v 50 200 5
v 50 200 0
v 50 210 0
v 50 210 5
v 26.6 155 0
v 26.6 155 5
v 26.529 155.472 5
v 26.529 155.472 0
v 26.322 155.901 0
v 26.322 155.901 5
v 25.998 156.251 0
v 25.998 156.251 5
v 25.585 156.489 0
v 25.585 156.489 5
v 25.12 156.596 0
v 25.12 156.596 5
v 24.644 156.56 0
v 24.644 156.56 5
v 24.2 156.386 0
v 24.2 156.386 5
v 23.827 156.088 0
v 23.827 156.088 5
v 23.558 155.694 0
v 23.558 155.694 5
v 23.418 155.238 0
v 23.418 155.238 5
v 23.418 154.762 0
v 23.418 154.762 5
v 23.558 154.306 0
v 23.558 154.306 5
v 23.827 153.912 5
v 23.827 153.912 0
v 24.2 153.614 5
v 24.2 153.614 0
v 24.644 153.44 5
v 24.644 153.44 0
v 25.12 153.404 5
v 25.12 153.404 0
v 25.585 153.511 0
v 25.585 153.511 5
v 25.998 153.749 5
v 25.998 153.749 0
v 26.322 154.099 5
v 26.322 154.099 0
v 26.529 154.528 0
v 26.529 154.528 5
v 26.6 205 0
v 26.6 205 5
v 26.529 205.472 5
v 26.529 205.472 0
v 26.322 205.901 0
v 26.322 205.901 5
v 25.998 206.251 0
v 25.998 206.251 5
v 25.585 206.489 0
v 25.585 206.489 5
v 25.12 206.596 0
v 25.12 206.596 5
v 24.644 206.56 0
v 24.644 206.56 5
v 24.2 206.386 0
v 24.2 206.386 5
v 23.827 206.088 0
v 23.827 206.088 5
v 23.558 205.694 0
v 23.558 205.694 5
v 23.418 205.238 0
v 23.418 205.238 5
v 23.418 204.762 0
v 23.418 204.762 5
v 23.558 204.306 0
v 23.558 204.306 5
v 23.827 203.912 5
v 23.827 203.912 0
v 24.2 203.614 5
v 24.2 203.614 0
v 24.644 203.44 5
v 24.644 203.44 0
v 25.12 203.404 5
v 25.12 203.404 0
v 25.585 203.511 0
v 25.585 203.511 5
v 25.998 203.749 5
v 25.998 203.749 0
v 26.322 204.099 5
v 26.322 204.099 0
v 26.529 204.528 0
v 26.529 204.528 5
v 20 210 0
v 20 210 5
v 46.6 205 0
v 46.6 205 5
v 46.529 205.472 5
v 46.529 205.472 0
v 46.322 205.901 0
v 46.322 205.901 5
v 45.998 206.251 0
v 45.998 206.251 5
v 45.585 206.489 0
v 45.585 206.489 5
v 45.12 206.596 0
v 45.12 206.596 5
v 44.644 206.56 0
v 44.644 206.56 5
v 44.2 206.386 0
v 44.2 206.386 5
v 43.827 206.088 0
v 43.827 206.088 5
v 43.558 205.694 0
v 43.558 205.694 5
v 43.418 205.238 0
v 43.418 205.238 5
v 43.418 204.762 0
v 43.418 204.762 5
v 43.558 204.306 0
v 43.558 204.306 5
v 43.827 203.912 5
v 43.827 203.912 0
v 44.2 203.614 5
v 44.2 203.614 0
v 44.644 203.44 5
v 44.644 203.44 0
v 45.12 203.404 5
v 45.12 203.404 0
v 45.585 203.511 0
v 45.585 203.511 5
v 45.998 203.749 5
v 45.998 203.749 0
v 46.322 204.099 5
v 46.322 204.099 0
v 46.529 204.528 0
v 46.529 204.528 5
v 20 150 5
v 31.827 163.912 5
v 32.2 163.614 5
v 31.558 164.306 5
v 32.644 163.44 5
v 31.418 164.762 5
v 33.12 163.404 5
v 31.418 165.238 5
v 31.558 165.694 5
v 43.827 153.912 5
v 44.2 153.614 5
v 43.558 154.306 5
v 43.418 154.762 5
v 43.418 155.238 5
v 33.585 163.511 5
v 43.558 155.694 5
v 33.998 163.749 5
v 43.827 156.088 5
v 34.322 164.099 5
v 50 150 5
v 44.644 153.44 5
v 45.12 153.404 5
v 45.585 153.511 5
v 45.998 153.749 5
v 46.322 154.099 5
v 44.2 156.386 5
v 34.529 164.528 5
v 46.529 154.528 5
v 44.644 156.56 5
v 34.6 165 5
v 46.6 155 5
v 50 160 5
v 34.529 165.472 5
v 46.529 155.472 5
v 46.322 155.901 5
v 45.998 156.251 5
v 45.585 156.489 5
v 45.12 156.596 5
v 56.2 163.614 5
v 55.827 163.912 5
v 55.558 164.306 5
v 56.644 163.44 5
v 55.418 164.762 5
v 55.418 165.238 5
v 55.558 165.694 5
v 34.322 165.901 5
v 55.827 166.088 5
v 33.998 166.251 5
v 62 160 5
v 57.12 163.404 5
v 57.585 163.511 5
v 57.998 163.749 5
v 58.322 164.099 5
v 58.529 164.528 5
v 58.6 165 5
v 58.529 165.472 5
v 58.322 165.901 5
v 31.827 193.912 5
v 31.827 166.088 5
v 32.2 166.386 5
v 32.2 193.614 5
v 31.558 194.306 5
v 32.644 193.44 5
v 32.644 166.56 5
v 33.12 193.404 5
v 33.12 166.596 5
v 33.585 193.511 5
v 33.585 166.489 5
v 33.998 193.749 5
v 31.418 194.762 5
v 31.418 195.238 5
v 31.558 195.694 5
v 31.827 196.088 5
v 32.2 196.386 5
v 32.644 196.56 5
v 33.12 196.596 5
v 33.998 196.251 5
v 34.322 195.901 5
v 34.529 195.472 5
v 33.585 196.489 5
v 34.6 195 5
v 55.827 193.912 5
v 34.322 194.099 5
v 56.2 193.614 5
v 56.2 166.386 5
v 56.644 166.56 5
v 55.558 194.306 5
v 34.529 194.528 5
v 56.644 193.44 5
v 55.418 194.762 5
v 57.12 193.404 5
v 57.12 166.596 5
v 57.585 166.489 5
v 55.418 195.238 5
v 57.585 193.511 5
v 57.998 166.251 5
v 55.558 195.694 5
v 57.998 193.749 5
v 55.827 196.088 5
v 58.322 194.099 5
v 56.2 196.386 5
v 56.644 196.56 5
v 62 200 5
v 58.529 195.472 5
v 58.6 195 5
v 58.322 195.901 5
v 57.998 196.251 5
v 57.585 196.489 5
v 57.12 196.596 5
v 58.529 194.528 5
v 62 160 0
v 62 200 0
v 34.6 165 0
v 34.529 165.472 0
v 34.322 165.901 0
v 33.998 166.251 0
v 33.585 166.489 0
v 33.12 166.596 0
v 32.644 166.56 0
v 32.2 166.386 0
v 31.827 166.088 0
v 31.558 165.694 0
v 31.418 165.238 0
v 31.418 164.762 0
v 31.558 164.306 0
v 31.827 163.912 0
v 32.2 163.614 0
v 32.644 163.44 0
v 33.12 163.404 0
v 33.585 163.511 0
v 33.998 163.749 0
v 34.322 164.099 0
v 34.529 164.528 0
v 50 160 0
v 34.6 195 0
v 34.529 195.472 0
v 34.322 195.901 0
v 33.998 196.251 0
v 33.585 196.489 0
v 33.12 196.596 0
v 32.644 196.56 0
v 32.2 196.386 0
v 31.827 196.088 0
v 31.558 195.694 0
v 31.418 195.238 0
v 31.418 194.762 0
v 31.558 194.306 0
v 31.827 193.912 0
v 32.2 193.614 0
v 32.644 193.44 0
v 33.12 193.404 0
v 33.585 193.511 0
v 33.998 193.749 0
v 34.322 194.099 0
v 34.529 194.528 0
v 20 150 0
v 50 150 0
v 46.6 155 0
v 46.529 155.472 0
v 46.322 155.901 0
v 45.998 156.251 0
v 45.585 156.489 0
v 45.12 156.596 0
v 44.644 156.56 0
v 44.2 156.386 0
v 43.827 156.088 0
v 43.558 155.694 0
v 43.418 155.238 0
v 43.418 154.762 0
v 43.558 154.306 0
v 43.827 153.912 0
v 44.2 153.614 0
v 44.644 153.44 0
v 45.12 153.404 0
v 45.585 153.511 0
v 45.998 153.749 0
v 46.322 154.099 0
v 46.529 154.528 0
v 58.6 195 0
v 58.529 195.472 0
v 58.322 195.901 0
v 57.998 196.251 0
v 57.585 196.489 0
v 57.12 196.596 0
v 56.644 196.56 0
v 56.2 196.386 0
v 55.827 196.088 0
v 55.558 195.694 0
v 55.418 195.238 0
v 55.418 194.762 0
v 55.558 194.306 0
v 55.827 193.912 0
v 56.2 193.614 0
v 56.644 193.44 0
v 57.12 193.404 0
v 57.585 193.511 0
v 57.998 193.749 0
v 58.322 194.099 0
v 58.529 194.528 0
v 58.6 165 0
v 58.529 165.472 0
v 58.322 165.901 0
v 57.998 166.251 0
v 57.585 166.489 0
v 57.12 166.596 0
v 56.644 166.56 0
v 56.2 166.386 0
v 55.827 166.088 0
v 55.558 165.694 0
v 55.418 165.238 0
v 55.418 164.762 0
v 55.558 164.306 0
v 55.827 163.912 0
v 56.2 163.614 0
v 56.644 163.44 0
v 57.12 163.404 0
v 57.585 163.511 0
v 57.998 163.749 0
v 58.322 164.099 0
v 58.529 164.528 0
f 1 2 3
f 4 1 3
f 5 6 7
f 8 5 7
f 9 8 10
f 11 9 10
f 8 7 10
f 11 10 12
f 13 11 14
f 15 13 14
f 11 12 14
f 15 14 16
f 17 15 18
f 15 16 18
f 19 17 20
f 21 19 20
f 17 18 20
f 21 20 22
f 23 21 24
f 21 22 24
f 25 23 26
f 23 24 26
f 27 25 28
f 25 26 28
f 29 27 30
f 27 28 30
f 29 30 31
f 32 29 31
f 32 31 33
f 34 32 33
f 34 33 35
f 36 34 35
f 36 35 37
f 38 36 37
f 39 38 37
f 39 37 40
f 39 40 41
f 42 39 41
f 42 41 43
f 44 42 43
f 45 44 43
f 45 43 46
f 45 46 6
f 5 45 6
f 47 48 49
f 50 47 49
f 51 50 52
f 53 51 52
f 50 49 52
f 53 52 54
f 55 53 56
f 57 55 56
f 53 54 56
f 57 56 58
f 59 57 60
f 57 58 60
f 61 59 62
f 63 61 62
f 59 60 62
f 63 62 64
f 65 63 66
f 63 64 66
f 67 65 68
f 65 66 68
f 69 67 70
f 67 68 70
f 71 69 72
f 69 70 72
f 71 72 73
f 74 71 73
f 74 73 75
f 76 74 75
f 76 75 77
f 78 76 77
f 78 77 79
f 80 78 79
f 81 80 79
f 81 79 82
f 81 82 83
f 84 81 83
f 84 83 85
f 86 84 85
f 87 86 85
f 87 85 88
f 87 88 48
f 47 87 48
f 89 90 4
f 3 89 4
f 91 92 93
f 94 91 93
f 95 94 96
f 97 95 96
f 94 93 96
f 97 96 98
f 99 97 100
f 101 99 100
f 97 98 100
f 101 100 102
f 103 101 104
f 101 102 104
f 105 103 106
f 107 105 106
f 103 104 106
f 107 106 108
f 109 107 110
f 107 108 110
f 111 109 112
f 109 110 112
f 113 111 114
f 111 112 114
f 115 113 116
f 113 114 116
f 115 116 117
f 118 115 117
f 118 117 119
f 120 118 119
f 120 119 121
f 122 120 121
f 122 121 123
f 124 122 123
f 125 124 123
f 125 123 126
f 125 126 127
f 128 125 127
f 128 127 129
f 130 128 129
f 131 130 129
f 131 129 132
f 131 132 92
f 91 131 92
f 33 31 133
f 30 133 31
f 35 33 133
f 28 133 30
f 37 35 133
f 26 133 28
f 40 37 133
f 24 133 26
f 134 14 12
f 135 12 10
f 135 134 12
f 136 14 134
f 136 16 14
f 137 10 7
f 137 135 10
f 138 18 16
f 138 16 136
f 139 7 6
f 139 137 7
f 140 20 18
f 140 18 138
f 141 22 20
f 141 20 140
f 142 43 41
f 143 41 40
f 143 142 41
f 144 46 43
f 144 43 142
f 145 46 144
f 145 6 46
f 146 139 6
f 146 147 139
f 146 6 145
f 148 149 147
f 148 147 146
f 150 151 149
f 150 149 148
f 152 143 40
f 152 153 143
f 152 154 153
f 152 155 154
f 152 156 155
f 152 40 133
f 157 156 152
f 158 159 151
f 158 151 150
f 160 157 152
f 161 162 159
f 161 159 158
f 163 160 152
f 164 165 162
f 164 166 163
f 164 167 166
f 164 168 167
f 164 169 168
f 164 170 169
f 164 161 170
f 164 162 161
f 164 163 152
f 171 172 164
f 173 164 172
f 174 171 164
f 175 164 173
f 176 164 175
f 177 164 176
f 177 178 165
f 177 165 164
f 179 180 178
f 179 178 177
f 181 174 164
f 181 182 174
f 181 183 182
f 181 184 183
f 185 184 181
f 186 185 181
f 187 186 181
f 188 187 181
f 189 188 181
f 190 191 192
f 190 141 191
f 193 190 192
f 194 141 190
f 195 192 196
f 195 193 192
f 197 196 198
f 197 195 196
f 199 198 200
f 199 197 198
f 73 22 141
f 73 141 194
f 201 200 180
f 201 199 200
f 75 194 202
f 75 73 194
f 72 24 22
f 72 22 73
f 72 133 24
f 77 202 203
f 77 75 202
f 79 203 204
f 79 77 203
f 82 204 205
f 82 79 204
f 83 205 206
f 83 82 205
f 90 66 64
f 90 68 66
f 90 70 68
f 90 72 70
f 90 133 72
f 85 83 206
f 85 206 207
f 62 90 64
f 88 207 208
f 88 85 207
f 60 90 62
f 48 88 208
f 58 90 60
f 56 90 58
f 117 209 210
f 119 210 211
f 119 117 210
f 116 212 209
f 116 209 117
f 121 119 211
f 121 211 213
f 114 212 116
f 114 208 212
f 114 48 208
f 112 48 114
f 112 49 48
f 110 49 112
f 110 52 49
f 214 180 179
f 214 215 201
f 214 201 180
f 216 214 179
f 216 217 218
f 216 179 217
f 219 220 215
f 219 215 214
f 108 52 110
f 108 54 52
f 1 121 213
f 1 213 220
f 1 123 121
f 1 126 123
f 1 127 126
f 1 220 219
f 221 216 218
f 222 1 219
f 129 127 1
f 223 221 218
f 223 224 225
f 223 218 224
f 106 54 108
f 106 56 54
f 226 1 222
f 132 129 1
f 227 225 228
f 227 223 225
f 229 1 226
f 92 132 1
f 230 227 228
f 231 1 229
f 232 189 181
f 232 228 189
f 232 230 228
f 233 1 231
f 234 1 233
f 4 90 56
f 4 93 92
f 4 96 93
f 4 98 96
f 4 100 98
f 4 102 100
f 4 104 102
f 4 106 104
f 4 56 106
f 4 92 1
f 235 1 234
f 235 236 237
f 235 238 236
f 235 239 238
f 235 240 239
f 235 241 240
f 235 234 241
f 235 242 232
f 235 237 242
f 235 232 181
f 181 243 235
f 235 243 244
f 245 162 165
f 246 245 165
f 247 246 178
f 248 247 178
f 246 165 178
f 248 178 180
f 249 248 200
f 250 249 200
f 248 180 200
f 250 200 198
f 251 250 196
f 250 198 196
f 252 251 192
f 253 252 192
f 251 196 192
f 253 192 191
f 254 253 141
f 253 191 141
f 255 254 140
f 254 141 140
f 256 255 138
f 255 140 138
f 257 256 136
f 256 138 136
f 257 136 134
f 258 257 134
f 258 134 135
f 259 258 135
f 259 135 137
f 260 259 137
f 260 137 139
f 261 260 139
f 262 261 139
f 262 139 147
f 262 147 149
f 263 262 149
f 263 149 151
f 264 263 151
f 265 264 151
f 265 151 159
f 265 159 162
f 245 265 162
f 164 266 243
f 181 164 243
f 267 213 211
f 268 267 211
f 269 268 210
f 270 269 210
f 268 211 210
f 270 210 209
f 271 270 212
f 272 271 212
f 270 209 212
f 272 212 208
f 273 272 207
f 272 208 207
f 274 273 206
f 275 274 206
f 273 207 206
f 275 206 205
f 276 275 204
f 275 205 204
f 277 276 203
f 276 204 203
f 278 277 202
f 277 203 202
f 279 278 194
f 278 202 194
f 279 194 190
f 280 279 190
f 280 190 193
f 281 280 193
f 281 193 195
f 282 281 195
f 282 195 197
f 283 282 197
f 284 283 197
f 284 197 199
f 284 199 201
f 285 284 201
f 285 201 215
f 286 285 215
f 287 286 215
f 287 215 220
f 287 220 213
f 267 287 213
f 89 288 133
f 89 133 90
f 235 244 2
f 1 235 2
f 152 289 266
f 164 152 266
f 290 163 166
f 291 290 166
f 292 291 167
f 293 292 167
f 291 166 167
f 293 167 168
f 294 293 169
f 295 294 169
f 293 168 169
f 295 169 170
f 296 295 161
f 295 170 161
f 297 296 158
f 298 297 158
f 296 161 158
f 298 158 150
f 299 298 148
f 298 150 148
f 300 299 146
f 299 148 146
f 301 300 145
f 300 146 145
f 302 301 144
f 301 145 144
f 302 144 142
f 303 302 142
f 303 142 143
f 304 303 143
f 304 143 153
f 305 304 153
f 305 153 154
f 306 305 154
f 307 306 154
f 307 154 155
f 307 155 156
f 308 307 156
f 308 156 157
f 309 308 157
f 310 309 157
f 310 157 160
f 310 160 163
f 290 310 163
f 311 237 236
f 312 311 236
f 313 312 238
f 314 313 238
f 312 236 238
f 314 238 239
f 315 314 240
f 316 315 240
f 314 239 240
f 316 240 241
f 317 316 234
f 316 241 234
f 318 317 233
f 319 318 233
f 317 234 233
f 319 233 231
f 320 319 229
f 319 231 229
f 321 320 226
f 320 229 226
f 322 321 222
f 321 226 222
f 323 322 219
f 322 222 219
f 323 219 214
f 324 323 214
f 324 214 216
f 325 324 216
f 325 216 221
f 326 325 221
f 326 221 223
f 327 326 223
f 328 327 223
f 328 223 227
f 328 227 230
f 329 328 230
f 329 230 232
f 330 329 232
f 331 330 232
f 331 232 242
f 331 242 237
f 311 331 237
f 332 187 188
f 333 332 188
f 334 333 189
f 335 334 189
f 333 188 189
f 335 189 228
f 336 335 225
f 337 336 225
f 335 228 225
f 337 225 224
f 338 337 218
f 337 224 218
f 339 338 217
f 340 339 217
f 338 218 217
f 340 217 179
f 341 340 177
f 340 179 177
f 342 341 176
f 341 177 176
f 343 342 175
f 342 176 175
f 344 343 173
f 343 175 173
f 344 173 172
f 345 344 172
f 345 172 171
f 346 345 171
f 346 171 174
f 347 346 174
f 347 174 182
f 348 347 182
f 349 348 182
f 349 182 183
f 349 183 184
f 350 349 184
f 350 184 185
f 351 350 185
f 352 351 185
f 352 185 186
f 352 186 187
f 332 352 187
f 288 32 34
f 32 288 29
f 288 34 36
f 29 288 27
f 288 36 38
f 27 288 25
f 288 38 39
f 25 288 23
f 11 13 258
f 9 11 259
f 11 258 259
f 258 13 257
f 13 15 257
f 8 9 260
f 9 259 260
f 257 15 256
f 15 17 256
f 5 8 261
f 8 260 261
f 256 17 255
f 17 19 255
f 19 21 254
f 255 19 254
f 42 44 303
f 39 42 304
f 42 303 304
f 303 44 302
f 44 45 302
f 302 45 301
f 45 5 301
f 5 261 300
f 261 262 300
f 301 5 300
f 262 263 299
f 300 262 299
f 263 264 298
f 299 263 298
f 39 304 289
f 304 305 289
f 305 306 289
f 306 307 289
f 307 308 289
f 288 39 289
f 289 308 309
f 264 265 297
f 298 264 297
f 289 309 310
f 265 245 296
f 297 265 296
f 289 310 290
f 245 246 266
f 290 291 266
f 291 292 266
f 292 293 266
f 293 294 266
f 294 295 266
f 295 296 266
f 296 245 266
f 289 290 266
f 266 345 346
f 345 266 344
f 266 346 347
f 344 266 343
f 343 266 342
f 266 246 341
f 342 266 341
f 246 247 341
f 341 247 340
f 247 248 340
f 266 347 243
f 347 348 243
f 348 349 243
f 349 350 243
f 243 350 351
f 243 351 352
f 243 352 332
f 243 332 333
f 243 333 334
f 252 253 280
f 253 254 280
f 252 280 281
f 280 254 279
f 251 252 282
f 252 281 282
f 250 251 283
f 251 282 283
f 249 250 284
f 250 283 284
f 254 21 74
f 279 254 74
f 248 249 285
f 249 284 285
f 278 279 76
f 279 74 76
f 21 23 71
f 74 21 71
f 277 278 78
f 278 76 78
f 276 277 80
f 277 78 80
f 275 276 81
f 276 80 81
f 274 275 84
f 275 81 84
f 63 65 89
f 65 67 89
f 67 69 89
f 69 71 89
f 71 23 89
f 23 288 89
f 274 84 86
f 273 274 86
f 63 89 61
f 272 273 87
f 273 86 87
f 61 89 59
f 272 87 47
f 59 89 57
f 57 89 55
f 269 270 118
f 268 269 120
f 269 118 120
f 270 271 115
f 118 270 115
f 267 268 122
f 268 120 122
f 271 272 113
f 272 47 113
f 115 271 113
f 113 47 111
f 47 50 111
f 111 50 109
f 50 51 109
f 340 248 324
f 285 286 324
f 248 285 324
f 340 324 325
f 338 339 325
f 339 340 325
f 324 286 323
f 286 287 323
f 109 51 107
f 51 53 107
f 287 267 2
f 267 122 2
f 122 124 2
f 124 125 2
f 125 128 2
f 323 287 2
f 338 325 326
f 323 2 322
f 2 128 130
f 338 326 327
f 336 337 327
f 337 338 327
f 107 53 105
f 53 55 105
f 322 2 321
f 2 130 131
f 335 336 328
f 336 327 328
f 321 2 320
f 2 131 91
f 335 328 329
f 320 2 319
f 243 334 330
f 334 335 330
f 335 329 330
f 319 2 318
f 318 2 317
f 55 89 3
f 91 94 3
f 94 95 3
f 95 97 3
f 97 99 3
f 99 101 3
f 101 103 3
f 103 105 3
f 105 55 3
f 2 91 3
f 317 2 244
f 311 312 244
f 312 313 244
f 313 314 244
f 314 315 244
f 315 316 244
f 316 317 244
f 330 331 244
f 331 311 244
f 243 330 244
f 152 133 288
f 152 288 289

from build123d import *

# Parameters (mm, degrees)
EXTRUDE_1_DEPTH     = 5
SKETCH_5_R          = 1.6
CUT_EXTRUDE_1_DEPTH = 329.148213465
SKETCH_6_W          = 3
SKETCH_6_H          = 30
CUT_EXTRUDE_2_DEPTH = 329.148213465
SKETCH_7_W          = 3
SKETCH_7_H          = 10
CUT_EXTRUDE_3_DEPTH = 329.148213465
SKETCH_8_W          = 15
SKETCH_8_H          = 3
CUT_EXTRUDE_4_DEPTH = 329.148213465
SKETCH_9_W          = 30
SKETCH_9_H          = 0.36
EXTRUDE_2_DEPTH     = 5
SKETCH_11_W         = 200
SKETCH_11_H         = 355
SKETCH_11_W_2       = 46
SKETCH_11_H_2       = 60
CUT_EXTRUDE_5_DEPTH = 329.148213465
CUT_EXTRUDE_7_DEPTH = 221.184013952
SKETCH_13_R         = 1.6
CUT_EXTRUDE_8_DEPTH = 220.018264079


with BuildPart() as part:
    # 草图3 → 凸台-拉伸1 (new body)
    with BuildSketch(Plane.XY):
        Polygon((-10, 267.5), (190, 267.5), (190, 230), (160, 230), (160, 130), (190, 130), (190, 50), (160, 50), (160, -50), (190, -50), (190, -87.5), (-10, -87.5), (-10, -50), (20, -50), (20, 50), (-10, 50), (-10, 130), (20, 130), (20, 230), (-10, 230), align=None)
    extrude(amount=EXTRUDE_1_DEPTH)

    # 草图5 → 切除-拉伸1 (cut, through all)
    with BuildSketch(Plane.XY.offset(5)):
        with Locations((33, 195)):
            Circle(SKETCH_5_R)
        with Locations((57, 195)):
            Circle(SKETCH_5_R)
        with Locations((33, 165)):
            Circle(SKETCH_5_R)
        with Locations((57, 165)):
            Circle(SKETCH_5_R)
        with Locations((123, 195)):
            Circle(SKETCH_5_R)
        with Locations((147, 195)):
            Circle(SKETCH_5_R)
        with Locations((123, 165)):
            Circle(SKETCH_5_R)
        with Locations((147, 165)):
            Circle(SKETCH_5_R)
        with Locations((33, 15)):
            Circle(SKETCH_5_R)
        with Locations((57, 15)):
            Circle(SKETCH_5_R)
        with Locations((33, -15)):
            Circle(SKETCH_5_R)
        with Locations((57, -15)):
            Circle(SKETCH_5_R)
        with Locations((123, 15)):
            Circle(SKETCH_5_R)
        with Locations((147, 15)):
            Circle(SKETCH_5_R)
        with Locations((123, -15)):
            Circle(SKETCH_5_R)
        with Locations((147, -15)):
            Circle(SKETCH_5_R)
    extrude(amount=-CUT_EXTRUDE_1_DEPTH, mode=Mode.SUBTRACT)

    # 草图6 → 切除-拉伸2 (cut, through all)
    with BuildSketch(Plane.XY.offset(5)):
        with Locations((-8.5, 90)):
            Rectangle(SKETCH_6_W, SKETCH_6_H)
        with Locations((188.5, 90)):
            Rectangle(SKETCH_6_W, SKETCH_6_H)
    extrude(amount=-CUT_EXTRUDE_2_DEPTH, mode=Mode.SUBTRACT)

    # 草图7 → 切除-拉伸3 (cut, through all)
    with BuildSketch(Plane.XY.offset(5)):
        with Locations((-8.5, 248.75)):
            Rectangle(SKETCH_7_W, SKETCH_7_H)
        with Locations((188.5, 248.75)):
            Rectangle(SKETCH_7_W, SKETCH_7_H)
        with Locations((-8.5, -68.75)):
            Rectangle(SKETCH_7_W, SKETCH_7_H)
        with Locations((188.5, -68.75)):
            Rectangle(SKETCH_7_W, SKETCH_7_H)
    extrude(amount=-CUT_EXTRUDE_3_DEPTH, mode=Mode.SUBTRACT)

    # 草图8 → 切除-拉伸4 (cut, through all)
    with BuildSketch(Plane.XY.offset(5)):
        with Locations((17.5, -86)):
            Rectangle(SKETCH_8_W, SKETCH_8_H)
        with Locations((52.5, -86)):
            Rectangle(SKETCH_8_W, SKETCH_8_H)
        with Locations((127.5, -86)):
            Rectangle(SKETCH_8_W, SKETCH_8_H)
        with Locations((162.5, -86)):
            Rectangle(SKETCH_8_W, SKETCH_8_H)
    extrude(amount=-CUT_EXTRUDE_4_DEPTH, mode=Mode.SUBTRACT)

    # 草图9 → 凸台-拉伸2 (add)
    with BuildSketch(Plane.XY.offset(5)):
        with Locations((5, 229.82)):
            Rectangle(SKETCH_9_W, SKETCH_9_H)
        with Locations((175, 229.82)):
            Rectangle(SKETCH_9_W, SKETCH_9_H)
    extrude(amount=-EXTRUDE_2_DEPTH)

    # 草图11 → 切除-拉伸5 (cut, through all)
    with BuildSketch(Plane.XY.offset(5)):
        with Locations((90, 90)):
            Rectangle(SKETCH_11_W, SKETCH_11_H)
        with Locations((43, 180)):
            Rectangle(SKETCH_11_W_2, SKETCH_11_H_2, mode=Mode.SUBTRACT)
    extrude(amount=-CUT_EXTRUDE_5_DEPTH, mode=Mode.SUBTRACT)

    # 草图14 → 切除-拉伸7 (cut, through all)
    with BuildSketch(Plane(origin=(0, 0, 0), x_dir=(-1, 0, 0), z_dir=(0, 0, -1))):
        Polygon((-66, 150), (-50, 150), (-50, 160), (-62, 160), (-62, 200), (-50, 200), (-50, 210), (-66, 210), (-66, 200), (-66, 160), align=None)
    extrude(amount=-CUT_EXTRUDE_7_DEPTH, mode=Mode.SUBTRACT)

    # 草图13 → 切除-拉伸8 (cut, through all)
    with BuildSketch(Plane.XY.offset(5)):
        with Locations((45, 205)):
            Circle(SKETCH_13_R)
        with Locations((25, 155)):
            Circle(SKETCH_13_R)
        with Locations((25, 205)):
            Circle(SKETCH_13_R)
        with Locations((45, 155)):
            Circle(SKETCH_13_R)
    extrude(amount=-CUT_EXTRUDE_8_DEPTH, mode=Mode.SUBTRACT)


solid = part.part
